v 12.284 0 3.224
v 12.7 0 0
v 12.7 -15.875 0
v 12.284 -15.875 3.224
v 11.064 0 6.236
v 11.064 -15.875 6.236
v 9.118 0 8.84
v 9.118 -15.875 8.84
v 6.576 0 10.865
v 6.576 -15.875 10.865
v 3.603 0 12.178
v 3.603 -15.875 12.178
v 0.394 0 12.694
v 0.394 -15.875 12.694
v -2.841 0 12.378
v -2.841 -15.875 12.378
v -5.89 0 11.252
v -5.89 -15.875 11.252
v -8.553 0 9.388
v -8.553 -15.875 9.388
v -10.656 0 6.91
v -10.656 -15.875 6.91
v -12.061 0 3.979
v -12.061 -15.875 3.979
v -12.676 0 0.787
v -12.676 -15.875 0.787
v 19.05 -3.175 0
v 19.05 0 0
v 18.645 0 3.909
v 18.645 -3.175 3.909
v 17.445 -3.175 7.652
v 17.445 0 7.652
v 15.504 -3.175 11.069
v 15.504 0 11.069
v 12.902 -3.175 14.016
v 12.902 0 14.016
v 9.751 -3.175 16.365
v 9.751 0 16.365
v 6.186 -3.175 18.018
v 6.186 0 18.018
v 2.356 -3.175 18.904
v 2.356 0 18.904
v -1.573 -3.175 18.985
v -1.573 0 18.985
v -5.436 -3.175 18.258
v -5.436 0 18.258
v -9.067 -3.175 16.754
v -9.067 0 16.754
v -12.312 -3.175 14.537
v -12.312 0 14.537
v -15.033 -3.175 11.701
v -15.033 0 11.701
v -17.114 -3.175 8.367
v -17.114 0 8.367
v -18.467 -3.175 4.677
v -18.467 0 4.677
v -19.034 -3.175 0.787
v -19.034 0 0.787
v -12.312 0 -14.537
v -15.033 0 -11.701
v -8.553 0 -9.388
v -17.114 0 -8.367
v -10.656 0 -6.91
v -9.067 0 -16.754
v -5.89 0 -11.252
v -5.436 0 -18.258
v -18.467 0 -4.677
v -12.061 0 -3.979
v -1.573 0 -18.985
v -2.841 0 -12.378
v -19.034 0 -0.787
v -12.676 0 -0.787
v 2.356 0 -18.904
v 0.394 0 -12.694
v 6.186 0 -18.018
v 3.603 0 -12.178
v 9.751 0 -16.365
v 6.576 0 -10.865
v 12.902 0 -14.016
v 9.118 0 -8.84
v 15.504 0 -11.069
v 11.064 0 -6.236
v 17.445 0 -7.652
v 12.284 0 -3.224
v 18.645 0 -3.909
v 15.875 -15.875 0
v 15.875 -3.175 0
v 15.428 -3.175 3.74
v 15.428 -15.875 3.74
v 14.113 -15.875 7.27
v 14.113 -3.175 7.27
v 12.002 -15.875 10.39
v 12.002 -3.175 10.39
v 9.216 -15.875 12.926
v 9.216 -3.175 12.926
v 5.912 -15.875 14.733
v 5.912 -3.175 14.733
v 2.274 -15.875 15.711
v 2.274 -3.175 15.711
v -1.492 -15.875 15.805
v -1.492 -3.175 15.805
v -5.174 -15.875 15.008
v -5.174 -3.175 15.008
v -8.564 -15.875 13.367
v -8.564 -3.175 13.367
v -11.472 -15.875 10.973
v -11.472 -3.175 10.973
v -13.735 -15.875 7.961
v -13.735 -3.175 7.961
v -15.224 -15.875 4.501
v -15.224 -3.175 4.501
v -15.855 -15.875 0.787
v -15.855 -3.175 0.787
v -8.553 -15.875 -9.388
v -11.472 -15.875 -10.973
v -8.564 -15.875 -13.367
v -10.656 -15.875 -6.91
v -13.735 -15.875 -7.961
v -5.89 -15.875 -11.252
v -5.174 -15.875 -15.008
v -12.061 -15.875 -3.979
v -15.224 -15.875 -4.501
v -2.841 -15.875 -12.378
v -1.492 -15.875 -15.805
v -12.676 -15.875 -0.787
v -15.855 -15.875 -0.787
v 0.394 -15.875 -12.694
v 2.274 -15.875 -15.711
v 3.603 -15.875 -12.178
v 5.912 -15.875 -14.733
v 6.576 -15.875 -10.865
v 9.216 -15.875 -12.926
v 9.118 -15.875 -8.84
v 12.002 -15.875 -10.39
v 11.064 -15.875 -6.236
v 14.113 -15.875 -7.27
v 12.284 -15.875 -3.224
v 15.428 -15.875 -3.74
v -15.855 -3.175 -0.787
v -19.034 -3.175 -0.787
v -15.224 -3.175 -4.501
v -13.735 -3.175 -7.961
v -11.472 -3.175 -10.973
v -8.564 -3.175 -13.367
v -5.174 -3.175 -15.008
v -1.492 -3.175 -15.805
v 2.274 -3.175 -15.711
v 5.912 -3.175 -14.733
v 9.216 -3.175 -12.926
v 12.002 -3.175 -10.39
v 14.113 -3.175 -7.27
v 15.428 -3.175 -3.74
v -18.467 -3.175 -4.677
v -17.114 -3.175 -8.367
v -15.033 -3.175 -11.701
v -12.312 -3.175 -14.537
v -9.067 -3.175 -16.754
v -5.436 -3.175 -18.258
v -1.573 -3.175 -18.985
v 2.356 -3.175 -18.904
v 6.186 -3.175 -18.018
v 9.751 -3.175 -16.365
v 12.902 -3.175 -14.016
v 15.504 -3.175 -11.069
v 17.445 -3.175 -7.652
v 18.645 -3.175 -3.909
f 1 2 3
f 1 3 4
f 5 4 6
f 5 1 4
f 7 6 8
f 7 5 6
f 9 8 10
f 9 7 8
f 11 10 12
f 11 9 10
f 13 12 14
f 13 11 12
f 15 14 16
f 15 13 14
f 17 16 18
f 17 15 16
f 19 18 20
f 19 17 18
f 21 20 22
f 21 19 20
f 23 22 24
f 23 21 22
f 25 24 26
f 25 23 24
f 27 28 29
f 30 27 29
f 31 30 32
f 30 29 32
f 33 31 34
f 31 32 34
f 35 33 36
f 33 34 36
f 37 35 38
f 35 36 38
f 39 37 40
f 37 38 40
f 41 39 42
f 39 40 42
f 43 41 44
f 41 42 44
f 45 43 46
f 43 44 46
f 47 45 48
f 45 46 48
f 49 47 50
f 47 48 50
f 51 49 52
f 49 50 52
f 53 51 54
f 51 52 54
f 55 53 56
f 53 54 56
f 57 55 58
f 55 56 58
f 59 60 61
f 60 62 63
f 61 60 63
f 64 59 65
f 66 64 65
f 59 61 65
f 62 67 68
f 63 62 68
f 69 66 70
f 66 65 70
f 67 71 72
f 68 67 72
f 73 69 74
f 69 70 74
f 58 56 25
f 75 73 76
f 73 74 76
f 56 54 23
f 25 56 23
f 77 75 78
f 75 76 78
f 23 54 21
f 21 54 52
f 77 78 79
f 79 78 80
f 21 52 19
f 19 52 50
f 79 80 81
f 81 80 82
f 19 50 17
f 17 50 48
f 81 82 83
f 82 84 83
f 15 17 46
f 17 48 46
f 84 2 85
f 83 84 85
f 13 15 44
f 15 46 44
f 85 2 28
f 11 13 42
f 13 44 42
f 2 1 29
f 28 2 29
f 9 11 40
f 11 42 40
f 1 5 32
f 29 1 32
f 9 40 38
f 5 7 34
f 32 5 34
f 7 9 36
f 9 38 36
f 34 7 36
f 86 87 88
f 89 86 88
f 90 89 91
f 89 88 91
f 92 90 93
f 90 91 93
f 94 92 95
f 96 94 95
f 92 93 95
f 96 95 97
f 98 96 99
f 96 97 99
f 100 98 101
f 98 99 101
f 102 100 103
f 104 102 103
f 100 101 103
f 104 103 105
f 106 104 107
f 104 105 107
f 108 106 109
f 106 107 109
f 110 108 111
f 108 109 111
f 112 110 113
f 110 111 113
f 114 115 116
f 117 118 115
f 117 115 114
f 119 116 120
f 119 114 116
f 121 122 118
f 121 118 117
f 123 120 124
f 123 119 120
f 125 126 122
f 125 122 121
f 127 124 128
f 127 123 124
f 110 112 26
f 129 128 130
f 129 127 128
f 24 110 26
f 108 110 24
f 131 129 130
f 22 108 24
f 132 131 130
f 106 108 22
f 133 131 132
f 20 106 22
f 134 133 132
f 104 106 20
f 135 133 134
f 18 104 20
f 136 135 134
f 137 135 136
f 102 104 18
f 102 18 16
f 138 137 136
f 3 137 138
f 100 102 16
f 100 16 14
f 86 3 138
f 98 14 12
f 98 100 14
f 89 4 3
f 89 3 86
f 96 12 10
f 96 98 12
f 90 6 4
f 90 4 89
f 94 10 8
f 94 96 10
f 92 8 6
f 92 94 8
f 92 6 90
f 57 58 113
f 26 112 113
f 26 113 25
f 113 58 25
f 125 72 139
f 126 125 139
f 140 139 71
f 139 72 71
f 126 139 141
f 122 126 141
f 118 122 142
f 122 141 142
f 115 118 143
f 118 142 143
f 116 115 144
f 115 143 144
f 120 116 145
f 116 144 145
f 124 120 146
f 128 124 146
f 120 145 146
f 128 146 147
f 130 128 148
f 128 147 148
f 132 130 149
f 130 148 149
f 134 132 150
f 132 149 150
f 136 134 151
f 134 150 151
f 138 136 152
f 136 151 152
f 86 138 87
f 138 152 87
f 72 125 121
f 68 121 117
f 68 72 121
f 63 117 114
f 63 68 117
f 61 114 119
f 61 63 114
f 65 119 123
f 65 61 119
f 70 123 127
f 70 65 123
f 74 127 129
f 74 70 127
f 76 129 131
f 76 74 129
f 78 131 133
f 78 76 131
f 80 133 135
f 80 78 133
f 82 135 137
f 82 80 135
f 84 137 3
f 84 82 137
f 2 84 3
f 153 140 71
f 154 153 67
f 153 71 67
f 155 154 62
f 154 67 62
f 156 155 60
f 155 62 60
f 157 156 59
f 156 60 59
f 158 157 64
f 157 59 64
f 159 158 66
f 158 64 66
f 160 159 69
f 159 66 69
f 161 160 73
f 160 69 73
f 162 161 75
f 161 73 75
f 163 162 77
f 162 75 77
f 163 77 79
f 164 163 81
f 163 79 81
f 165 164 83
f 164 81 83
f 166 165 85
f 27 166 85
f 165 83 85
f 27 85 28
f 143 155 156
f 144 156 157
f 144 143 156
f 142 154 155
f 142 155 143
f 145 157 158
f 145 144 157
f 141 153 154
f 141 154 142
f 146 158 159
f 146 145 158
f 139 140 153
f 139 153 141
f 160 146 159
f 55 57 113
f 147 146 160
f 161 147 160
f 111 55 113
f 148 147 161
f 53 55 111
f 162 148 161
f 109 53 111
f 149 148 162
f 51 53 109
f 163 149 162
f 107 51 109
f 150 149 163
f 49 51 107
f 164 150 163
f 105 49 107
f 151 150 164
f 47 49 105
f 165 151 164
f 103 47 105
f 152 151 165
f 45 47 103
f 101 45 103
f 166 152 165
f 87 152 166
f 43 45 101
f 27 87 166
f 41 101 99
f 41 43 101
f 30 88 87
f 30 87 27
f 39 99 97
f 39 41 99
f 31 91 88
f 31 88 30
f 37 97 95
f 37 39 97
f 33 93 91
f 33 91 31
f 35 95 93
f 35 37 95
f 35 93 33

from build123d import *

# Parameters (mm, degrees)
F0_R     = 15.875
F0_R_2   = 12.7
F1_DEPTH = 15.875
F0_R_3   = 19.05
F2_DEPTH = 3.175
F4_DEPTH = 15.876


with BuildPart() as f1:
    # F0 (on Front) → F1 (new body)
    with BuildSketch(Plane.XZ):
        Circle(F0_R)
        Circle(F0_R_2, mode=Mode.SUBTRACT)
    extrude(amount=F1_DEPTH)

    # F0 (on Front) → F2 (join)
    with BuildSketch(Plane.XZ):
        Circle(F0_R_3)
        Circle(F0_R, mode=Mode.SUBTRACT)
    extrude(amount=F2_DEPTH)

    # F3 (on face) → F4 (cut, through all)
    with BuildSketch(Plane(origin=(0, 0, 0), x_dir=(-1, 0, 0), z_dir=(0, 1, 0))):
        with BuildLine():
            Line((19.03372, 0.7874), (12.675567, 0.7874))
            ThreePointArc((12.675567, 0.7874), (12.69389, 0.393889), (12.7, 0))
            ThreePointArc((12.7, 0), (12.69389, -0.393889), (12.675567, -0.7874))
            Line((12.675567, -0.7874), (19.03372, -0.7874))
            ThreePointArc((19.03372, -0.7874), (19.04593, -0.393784), (19.05, 0))
            ThreePointArc((19.05, 0), (19.04593, 0.393784), (19.03372, 0.7874))
        make_face()
    extrude(amount=-F4_DEPTH, mode=Mode.SUBTRACT)


solid = f1.part
